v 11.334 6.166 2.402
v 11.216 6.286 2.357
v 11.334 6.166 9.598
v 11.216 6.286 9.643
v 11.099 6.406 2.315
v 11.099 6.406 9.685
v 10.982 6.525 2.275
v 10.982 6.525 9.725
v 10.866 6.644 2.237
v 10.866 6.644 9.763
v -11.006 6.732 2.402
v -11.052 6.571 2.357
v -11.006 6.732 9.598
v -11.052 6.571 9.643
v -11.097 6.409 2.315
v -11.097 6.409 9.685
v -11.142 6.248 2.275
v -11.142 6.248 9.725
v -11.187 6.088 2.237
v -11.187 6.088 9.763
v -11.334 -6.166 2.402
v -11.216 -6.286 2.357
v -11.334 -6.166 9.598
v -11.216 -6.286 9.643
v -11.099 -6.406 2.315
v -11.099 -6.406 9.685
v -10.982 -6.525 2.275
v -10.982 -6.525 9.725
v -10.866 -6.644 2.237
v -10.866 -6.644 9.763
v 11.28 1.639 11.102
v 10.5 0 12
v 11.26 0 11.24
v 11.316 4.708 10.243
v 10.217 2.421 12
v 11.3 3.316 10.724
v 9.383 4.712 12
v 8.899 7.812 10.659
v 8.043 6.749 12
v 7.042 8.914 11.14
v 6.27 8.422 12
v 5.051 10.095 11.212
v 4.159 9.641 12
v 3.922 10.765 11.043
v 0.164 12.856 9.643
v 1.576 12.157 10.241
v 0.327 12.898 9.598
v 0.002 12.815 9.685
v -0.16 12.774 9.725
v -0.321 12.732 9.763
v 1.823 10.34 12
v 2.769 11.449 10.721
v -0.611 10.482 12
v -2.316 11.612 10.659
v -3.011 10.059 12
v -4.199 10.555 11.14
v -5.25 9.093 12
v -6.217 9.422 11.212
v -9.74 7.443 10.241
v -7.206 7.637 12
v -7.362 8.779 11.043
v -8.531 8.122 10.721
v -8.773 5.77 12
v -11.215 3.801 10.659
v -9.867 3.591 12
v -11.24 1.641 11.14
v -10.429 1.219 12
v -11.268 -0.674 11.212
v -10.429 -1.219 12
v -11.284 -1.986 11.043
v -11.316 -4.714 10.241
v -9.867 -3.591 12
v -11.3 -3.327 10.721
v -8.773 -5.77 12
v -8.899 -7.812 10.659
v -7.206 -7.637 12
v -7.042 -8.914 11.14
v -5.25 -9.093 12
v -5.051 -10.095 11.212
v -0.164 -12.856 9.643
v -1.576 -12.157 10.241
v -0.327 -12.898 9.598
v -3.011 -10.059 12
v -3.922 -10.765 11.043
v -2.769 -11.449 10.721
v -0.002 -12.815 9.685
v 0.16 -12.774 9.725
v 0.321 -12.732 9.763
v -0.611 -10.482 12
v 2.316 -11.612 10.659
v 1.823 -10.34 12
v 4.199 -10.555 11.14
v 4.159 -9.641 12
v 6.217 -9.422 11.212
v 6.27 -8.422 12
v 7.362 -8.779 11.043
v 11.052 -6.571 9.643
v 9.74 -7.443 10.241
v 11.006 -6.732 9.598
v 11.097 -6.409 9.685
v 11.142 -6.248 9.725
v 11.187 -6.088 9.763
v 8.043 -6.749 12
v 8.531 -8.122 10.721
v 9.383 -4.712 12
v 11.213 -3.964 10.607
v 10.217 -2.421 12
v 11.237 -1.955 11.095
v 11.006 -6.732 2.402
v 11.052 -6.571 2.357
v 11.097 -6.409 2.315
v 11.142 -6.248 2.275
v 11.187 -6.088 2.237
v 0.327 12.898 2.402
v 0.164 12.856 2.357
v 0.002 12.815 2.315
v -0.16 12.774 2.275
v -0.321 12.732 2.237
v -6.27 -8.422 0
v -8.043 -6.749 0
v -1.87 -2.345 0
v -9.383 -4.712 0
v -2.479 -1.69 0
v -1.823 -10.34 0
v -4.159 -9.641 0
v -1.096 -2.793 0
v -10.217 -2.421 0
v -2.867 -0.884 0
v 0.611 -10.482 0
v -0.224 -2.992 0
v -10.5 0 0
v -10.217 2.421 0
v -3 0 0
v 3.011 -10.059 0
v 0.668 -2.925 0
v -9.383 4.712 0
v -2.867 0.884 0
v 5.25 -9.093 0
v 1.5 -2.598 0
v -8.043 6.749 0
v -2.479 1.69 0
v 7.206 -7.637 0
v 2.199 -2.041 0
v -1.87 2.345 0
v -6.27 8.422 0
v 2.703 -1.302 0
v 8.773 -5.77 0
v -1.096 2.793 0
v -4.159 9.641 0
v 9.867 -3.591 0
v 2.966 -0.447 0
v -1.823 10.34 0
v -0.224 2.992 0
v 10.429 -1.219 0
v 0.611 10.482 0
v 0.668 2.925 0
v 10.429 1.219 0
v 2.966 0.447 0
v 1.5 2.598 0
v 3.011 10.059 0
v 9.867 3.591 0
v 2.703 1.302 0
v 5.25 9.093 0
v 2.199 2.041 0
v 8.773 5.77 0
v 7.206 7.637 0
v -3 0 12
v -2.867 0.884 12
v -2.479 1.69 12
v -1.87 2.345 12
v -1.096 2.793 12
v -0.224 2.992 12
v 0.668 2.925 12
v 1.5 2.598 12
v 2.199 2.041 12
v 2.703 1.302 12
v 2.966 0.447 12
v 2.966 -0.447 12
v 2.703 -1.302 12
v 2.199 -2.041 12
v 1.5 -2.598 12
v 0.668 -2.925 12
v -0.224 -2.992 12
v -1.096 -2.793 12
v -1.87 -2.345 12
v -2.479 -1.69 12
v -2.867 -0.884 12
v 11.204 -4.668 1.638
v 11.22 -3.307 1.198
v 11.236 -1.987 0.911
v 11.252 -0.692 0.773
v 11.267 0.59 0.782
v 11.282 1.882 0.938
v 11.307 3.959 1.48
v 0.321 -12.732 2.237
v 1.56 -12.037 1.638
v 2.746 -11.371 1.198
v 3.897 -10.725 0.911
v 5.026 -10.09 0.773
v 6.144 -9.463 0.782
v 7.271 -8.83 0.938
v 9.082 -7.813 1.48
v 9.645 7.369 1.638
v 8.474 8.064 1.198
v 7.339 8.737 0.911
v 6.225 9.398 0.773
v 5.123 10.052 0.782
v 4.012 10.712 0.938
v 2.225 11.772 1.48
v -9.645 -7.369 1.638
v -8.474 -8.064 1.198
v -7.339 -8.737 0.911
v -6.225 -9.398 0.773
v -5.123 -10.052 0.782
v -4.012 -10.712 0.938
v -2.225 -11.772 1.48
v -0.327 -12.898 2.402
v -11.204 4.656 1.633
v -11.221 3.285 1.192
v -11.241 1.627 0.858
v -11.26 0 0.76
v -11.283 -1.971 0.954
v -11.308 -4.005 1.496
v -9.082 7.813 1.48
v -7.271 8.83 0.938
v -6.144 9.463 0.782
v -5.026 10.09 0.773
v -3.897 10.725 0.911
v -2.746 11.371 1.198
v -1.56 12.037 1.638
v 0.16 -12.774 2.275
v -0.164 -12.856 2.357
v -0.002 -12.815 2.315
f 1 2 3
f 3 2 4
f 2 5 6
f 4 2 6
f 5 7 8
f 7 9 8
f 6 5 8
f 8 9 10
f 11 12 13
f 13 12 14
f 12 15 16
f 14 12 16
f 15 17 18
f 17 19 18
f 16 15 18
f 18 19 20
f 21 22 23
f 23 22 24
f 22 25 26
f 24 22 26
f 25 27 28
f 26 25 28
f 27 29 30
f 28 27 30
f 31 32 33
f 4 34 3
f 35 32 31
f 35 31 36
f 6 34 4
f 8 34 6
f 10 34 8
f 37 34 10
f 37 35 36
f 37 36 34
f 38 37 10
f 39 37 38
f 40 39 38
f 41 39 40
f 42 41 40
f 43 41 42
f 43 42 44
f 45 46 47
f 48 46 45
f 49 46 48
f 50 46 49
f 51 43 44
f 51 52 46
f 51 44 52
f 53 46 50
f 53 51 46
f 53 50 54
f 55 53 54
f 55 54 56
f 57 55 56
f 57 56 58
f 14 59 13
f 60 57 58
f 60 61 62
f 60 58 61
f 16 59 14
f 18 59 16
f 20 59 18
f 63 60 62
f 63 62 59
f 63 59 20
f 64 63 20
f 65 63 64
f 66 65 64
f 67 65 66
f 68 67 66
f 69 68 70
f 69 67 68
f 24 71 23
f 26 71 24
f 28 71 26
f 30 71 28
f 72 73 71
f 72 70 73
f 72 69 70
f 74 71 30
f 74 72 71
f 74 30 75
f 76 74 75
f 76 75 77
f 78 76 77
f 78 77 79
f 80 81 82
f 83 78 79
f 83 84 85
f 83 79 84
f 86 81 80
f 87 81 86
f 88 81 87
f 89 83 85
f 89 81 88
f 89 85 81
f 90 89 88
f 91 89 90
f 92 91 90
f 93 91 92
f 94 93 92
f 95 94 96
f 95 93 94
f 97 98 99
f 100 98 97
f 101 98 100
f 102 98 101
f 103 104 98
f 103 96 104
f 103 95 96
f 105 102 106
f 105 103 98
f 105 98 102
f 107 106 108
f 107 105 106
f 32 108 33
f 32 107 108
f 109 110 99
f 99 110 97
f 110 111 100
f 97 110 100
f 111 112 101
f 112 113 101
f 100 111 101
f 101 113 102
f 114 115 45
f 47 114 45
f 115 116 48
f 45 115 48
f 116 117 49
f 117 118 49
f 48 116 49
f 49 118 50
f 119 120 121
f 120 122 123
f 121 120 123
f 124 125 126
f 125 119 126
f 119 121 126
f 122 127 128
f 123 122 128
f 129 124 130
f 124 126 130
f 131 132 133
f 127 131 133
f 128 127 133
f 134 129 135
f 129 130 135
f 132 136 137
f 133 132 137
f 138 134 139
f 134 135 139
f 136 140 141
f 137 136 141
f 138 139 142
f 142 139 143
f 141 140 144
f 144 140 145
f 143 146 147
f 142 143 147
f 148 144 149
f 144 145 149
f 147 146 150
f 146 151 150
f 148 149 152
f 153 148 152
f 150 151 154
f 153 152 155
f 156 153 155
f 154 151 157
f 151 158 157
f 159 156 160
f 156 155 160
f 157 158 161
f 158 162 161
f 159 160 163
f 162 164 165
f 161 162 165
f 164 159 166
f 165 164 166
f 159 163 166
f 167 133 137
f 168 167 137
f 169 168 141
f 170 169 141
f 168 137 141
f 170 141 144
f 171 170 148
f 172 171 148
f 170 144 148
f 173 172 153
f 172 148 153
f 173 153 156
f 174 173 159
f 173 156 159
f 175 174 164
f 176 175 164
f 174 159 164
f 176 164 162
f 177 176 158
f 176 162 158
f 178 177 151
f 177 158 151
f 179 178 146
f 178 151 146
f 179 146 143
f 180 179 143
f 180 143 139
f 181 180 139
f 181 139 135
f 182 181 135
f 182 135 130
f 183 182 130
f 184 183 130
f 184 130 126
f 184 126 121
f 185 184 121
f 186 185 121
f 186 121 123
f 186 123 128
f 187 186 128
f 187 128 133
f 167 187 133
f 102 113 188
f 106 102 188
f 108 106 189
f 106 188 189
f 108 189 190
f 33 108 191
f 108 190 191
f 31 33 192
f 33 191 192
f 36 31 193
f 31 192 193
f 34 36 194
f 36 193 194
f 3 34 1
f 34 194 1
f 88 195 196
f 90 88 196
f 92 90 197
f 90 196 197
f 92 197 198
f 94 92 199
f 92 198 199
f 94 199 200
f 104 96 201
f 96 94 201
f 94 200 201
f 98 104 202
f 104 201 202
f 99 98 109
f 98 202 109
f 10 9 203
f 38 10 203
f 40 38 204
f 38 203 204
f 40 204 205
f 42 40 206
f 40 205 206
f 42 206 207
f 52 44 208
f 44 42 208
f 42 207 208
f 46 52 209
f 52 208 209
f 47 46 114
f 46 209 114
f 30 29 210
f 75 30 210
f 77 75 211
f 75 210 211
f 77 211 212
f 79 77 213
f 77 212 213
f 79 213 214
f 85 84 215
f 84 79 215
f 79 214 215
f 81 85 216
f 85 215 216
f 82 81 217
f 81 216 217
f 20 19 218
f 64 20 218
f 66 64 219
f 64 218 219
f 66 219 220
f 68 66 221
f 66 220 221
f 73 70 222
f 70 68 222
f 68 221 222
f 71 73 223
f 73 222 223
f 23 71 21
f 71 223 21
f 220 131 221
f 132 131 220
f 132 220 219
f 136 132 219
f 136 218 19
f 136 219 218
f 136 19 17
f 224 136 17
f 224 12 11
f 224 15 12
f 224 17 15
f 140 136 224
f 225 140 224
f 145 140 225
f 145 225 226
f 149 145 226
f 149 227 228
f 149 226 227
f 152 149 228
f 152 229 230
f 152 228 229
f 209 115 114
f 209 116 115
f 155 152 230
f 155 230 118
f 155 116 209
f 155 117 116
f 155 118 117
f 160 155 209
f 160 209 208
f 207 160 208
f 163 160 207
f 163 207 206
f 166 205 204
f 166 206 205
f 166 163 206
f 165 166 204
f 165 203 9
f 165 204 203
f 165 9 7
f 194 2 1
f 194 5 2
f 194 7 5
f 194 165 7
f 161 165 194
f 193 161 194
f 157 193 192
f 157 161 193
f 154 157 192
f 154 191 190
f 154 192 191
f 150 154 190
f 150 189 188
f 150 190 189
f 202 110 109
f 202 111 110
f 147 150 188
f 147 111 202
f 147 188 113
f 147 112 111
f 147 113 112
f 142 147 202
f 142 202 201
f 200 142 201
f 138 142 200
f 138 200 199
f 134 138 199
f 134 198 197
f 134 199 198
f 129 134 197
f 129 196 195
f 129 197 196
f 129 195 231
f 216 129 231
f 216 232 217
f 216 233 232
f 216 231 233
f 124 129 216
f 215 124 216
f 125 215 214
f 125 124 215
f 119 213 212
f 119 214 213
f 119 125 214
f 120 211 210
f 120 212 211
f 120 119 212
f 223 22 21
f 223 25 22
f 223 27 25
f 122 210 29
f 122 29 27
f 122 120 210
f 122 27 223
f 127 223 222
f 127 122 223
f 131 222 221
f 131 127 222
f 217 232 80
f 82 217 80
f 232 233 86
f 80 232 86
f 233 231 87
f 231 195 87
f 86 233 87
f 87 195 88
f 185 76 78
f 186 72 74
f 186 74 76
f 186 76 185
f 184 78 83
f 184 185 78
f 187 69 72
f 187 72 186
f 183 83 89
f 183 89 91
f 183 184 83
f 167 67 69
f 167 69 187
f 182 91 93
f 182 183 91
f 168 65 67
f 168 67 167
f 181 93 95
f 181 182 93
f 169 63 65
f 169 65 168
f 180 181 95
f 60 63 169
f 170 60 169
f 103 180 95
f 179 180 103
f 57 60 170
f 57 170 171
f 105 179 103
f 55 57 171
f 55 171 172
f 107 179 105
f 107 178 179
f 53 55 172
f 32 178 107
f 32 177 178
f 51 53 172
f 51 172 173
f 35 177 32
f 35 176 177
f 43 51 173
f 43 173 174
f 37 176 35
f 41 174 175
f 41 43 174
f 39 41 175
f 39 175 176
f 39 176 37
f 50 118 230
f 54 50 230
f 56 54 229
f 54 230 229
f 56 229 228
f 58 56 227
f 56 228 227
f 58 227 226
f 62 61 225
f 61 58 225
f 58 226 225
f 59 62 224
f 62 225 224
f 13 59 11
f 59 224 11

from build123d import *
from OCP.BRepFilletAPI import BRepFilletAPI_MakeChamfer

# Parameters (mm, degrees)
BOSS_EXTRUDE1_DEPTH = 12
SKETCH2_OUTSIDE_W   = 51.976
SKETCH2_OUTSIDE_H   = 55.304
SKETCH2_OUTSIDE_R   = 10.5
CUT_EXTRUDE1_DEPTH  = 10
CUT_EXTRUDE1_DRAFT  = -45
SKETCH3_OUTSIDE_W   = 51.976
SKETCH3_OUTSIDE_H   = 55.304
SKETCH3_OUTSIDE_R   = 10.5
CUT_EXTRUDE2_DEPTH  = 10
CUT_EXTRUDE2_DRAFT  = -45
CHAMFER2_SIZE       = 0.2
CHAMFER2_SIZE2      = 0.546410162
SKETCH5_R           = 3
CUT_EXTRUDE5_DEPTH  = 20


with BuildPart() as part:
    # Sketch1 → Boss-Extrude1 (new body)
    with BuildSketch(Plane.XY):
        Polygon((11.180698914, -6.634461418), (11.335961585, 6.365538582), (0.155262671, 13), (-11.180698914, 6.634461418), (-11.335961585, -6.365538582), (-0.155262671, -13), align=None)
    extrude(amount=BOSS_EXTRUDE1_DEPTH)


with BuildPart() as cut_extrude1_tool:
    # Sketch2 outside → Cut-Extrude1 (with draft: the straight prism first)
    with BuildSketch(Plane.XY.offset(12)):
        Rectangle(SKETCH2_OUTSIDE_W, SKETCH2_OUTSIDE_H)
        Circle(SKETCH2_OUTSIDE_R, mode=Mode.SUBTRACT)
    extrude(amount=-CUT_EXTRUDE1_DEPTH)
    # Cut-Extrude1: the draft: its side faces are tilted about the plane it starts from
    cut_extrude1_sides = [cut_extrude1_tool.faces().sort_by_distance(p)[0] for p in [
        (0, -27.652, 7),
        (25.988, 0, 7),
        (0, 27.652, 7),
        (-25.988, 0, 7),
        (-10.5, 0, 7),
    ]]
    draft(cut_extrude1_sides, Plane.XY.offset(12), CUT_EXTRUDE1_DRAFT)


with BuildPart() as part_1:
    add(part.part)

    # Cut-Extrude1: cut by cut_extrude1_tool
    add(cut_extrude1_tool.part, mode=Mode.SUBTRACT)


with BuildPart() as cut_extrude2_tool:
    # Sketch3 outside → Cut-Extrude2 (with draft: the straight prism first)
    with BuildSketch(Plane(origin=(0, 0, 0), x_dir=(-1, 0, 0), z_dir=(0, 0, -1))):
        Rectangle(SKETCH3_OUTSIDE_W, SKETCH3_OUTSIDE_H)
        Circle(SKETCH3_OUTSIDE_R, mode=Mode.SUBTRACT)
    extrude(amount=-CUT_EXTRUDE2_DEPTH)
    # Cut-Extrude2: the draft: its side faces are tilted about the plane it starts from
    cut_extrude2_sides = [cut_extrude2_tool.faces().sort_by_distance(p)[0] for p in [
        (0, -27.652, 5),
        (-25.988, 0, 5),
        (0, 27.652, 5),
        (25.988, 0, 5),
        (10.5, 0, 5),
    ]]
    draft(cut_extrude2_sides, Plane(origin=(0, 0, 0), x_dir=(-1, 0, 0), z_dir=(0, 0, -1)), CUT_EXTRUDE2_DRAFT)


with BuildPart() as part_2:
    add(part_1.part)

    # Cut-Extrude2: cut by cut_extrude2_tool
    add(cut_extrude2_tool.part, mode=Mode.SUBTRACT)

    # Chamfer2: one chamfer whose edges measure the first distance from different faces: ONE call of the kernel's chamfer builder (chamfer() names one face for all edges)
    chamfer2_edges_1 = [part_2.edges().sort_by_distance(p)[0] for p in [
        (11.335961585, 6.365538582, 6),
    ]]
    chamfer2_side_1 = [part_2.faces().sort_by_distance(p)[0] for p in [
        (11.258330249, -0.134461418, 6),
    ]]
    chamfer2_edges_2 = [part_2.edges().sort_by_distance(p)[0] for p in [
        (0.155262671, 13, 6),
    ]]
    chamfer2_side_2 = [part_2.faces().sort_by_distance(p)[0] for p in [
        (5.745612128, 9.682769291, 6),
    ]]
    chamfer2_edges_3 = [part_2.edges().sort_by_distance(p)[0] for p in [
        (-11.180698914, 6.634461418, 6),
    ]]
    chamfer2_side_3 = [part_2.faces().sort_by_distance(p)[0] for p in [
        (-5.512718121, 9.817230709, 6),
    ]]
    chamfer2_edges_4 = [part_2.edges().sort_by_distance(p)[0] for p in [
        (-11.335961585, -6.365538582, 6),
    ]]
    chamfer2_side_4 = [part_2.faces().sort_by_distance(p)[0] for p in [
        (-11.258330249, 0.134461418, 6),
    ]]
    chamfer2_edges_5 = [part_2.edges().sort_by_distance(p)[0] for p in [
        (-0.155262671, -13, 6),
    ]]
    chamfer2_side_5 = [part_2.faces().sort_by_distance(p)[0] for p in [
        (-5.745612128, -9.682769291, 6),
    ]]
    chamfer2_edges_6 = [part_2.edges().sort_by_distance(p)[0] for p in [
        (11.180698914, -6.634461418, 6),
    ]]
    chamfer2_side_6 = [part_2.faces().sort_by_distance(p)[0] for p in [
        (5.512718121, -9.817230709, 6),
    ]]
    chamfer2 = BRepFilletAPI_MakeChamfer(part_2.part.solid().wrapped)
    for e in chamfer2_edges_1:
        chamfer2.Add(CHAMFER2_SIZE, CHAMFER2_SIZE2, e.wrapped, chamfer2_side_1[0].wrapped)  # the first distance lies on this face
    for e in chamfer2_edges_2:
        chamfer2.Add(CHAMFER2_SIZE, CHAMFER2_SIZE2, e.wrapped, chamfer2_side_2[0].wrapped)  # the first distance lies on this face
    for e in chamfer2_edges_3:
        chamfer2.Add(CHAMFER2_SIZE, CHAMFER2_SIZE2, e.wrapped, chamfer2_side_3[0].wrapped)  # the first distance lies on this face
    for e in chamfer2_edges_4:
        chamfer2.Add(CHAMFER2_SIZE, CHAMFER2_SIZE2, e.wrapped, chamfer2_side_4[0].wrapped)  # the first distance lies on this face
    for e in chamfer2_edges_5:
        chamfer2.Add(CHAMFER2_SIZE, CHAMFER2_SIZE2, e.wrapped, chamfer2_side_5[0].wrapped)  # the first distance lies on this face
    for e in chamfer2_edges_6:
        chamfer2.Add(CHAMFER2_SIZE, CHAMFER2_SIZE2, e.wrapped, chamfer2_side_6[0].wrapped)  # the first distance lies on this face
    add(Compound.cast(chamfer2.Shape()), mode=Mode.REPLACE)

    # Sketch5 → Cut-Extrude5 (cut)
    with BuildSketch(Plane(origin=(0, 0, 0), x_dir=(-1, 0, 0), z_dir=(0, 0, -1))):
        Circle(SKETCH5_R)
    extrude(amount=-CUT_EXTRUDE5_DEPTH, mode=Mode.SUBTRACT)


solid = part_2.part
